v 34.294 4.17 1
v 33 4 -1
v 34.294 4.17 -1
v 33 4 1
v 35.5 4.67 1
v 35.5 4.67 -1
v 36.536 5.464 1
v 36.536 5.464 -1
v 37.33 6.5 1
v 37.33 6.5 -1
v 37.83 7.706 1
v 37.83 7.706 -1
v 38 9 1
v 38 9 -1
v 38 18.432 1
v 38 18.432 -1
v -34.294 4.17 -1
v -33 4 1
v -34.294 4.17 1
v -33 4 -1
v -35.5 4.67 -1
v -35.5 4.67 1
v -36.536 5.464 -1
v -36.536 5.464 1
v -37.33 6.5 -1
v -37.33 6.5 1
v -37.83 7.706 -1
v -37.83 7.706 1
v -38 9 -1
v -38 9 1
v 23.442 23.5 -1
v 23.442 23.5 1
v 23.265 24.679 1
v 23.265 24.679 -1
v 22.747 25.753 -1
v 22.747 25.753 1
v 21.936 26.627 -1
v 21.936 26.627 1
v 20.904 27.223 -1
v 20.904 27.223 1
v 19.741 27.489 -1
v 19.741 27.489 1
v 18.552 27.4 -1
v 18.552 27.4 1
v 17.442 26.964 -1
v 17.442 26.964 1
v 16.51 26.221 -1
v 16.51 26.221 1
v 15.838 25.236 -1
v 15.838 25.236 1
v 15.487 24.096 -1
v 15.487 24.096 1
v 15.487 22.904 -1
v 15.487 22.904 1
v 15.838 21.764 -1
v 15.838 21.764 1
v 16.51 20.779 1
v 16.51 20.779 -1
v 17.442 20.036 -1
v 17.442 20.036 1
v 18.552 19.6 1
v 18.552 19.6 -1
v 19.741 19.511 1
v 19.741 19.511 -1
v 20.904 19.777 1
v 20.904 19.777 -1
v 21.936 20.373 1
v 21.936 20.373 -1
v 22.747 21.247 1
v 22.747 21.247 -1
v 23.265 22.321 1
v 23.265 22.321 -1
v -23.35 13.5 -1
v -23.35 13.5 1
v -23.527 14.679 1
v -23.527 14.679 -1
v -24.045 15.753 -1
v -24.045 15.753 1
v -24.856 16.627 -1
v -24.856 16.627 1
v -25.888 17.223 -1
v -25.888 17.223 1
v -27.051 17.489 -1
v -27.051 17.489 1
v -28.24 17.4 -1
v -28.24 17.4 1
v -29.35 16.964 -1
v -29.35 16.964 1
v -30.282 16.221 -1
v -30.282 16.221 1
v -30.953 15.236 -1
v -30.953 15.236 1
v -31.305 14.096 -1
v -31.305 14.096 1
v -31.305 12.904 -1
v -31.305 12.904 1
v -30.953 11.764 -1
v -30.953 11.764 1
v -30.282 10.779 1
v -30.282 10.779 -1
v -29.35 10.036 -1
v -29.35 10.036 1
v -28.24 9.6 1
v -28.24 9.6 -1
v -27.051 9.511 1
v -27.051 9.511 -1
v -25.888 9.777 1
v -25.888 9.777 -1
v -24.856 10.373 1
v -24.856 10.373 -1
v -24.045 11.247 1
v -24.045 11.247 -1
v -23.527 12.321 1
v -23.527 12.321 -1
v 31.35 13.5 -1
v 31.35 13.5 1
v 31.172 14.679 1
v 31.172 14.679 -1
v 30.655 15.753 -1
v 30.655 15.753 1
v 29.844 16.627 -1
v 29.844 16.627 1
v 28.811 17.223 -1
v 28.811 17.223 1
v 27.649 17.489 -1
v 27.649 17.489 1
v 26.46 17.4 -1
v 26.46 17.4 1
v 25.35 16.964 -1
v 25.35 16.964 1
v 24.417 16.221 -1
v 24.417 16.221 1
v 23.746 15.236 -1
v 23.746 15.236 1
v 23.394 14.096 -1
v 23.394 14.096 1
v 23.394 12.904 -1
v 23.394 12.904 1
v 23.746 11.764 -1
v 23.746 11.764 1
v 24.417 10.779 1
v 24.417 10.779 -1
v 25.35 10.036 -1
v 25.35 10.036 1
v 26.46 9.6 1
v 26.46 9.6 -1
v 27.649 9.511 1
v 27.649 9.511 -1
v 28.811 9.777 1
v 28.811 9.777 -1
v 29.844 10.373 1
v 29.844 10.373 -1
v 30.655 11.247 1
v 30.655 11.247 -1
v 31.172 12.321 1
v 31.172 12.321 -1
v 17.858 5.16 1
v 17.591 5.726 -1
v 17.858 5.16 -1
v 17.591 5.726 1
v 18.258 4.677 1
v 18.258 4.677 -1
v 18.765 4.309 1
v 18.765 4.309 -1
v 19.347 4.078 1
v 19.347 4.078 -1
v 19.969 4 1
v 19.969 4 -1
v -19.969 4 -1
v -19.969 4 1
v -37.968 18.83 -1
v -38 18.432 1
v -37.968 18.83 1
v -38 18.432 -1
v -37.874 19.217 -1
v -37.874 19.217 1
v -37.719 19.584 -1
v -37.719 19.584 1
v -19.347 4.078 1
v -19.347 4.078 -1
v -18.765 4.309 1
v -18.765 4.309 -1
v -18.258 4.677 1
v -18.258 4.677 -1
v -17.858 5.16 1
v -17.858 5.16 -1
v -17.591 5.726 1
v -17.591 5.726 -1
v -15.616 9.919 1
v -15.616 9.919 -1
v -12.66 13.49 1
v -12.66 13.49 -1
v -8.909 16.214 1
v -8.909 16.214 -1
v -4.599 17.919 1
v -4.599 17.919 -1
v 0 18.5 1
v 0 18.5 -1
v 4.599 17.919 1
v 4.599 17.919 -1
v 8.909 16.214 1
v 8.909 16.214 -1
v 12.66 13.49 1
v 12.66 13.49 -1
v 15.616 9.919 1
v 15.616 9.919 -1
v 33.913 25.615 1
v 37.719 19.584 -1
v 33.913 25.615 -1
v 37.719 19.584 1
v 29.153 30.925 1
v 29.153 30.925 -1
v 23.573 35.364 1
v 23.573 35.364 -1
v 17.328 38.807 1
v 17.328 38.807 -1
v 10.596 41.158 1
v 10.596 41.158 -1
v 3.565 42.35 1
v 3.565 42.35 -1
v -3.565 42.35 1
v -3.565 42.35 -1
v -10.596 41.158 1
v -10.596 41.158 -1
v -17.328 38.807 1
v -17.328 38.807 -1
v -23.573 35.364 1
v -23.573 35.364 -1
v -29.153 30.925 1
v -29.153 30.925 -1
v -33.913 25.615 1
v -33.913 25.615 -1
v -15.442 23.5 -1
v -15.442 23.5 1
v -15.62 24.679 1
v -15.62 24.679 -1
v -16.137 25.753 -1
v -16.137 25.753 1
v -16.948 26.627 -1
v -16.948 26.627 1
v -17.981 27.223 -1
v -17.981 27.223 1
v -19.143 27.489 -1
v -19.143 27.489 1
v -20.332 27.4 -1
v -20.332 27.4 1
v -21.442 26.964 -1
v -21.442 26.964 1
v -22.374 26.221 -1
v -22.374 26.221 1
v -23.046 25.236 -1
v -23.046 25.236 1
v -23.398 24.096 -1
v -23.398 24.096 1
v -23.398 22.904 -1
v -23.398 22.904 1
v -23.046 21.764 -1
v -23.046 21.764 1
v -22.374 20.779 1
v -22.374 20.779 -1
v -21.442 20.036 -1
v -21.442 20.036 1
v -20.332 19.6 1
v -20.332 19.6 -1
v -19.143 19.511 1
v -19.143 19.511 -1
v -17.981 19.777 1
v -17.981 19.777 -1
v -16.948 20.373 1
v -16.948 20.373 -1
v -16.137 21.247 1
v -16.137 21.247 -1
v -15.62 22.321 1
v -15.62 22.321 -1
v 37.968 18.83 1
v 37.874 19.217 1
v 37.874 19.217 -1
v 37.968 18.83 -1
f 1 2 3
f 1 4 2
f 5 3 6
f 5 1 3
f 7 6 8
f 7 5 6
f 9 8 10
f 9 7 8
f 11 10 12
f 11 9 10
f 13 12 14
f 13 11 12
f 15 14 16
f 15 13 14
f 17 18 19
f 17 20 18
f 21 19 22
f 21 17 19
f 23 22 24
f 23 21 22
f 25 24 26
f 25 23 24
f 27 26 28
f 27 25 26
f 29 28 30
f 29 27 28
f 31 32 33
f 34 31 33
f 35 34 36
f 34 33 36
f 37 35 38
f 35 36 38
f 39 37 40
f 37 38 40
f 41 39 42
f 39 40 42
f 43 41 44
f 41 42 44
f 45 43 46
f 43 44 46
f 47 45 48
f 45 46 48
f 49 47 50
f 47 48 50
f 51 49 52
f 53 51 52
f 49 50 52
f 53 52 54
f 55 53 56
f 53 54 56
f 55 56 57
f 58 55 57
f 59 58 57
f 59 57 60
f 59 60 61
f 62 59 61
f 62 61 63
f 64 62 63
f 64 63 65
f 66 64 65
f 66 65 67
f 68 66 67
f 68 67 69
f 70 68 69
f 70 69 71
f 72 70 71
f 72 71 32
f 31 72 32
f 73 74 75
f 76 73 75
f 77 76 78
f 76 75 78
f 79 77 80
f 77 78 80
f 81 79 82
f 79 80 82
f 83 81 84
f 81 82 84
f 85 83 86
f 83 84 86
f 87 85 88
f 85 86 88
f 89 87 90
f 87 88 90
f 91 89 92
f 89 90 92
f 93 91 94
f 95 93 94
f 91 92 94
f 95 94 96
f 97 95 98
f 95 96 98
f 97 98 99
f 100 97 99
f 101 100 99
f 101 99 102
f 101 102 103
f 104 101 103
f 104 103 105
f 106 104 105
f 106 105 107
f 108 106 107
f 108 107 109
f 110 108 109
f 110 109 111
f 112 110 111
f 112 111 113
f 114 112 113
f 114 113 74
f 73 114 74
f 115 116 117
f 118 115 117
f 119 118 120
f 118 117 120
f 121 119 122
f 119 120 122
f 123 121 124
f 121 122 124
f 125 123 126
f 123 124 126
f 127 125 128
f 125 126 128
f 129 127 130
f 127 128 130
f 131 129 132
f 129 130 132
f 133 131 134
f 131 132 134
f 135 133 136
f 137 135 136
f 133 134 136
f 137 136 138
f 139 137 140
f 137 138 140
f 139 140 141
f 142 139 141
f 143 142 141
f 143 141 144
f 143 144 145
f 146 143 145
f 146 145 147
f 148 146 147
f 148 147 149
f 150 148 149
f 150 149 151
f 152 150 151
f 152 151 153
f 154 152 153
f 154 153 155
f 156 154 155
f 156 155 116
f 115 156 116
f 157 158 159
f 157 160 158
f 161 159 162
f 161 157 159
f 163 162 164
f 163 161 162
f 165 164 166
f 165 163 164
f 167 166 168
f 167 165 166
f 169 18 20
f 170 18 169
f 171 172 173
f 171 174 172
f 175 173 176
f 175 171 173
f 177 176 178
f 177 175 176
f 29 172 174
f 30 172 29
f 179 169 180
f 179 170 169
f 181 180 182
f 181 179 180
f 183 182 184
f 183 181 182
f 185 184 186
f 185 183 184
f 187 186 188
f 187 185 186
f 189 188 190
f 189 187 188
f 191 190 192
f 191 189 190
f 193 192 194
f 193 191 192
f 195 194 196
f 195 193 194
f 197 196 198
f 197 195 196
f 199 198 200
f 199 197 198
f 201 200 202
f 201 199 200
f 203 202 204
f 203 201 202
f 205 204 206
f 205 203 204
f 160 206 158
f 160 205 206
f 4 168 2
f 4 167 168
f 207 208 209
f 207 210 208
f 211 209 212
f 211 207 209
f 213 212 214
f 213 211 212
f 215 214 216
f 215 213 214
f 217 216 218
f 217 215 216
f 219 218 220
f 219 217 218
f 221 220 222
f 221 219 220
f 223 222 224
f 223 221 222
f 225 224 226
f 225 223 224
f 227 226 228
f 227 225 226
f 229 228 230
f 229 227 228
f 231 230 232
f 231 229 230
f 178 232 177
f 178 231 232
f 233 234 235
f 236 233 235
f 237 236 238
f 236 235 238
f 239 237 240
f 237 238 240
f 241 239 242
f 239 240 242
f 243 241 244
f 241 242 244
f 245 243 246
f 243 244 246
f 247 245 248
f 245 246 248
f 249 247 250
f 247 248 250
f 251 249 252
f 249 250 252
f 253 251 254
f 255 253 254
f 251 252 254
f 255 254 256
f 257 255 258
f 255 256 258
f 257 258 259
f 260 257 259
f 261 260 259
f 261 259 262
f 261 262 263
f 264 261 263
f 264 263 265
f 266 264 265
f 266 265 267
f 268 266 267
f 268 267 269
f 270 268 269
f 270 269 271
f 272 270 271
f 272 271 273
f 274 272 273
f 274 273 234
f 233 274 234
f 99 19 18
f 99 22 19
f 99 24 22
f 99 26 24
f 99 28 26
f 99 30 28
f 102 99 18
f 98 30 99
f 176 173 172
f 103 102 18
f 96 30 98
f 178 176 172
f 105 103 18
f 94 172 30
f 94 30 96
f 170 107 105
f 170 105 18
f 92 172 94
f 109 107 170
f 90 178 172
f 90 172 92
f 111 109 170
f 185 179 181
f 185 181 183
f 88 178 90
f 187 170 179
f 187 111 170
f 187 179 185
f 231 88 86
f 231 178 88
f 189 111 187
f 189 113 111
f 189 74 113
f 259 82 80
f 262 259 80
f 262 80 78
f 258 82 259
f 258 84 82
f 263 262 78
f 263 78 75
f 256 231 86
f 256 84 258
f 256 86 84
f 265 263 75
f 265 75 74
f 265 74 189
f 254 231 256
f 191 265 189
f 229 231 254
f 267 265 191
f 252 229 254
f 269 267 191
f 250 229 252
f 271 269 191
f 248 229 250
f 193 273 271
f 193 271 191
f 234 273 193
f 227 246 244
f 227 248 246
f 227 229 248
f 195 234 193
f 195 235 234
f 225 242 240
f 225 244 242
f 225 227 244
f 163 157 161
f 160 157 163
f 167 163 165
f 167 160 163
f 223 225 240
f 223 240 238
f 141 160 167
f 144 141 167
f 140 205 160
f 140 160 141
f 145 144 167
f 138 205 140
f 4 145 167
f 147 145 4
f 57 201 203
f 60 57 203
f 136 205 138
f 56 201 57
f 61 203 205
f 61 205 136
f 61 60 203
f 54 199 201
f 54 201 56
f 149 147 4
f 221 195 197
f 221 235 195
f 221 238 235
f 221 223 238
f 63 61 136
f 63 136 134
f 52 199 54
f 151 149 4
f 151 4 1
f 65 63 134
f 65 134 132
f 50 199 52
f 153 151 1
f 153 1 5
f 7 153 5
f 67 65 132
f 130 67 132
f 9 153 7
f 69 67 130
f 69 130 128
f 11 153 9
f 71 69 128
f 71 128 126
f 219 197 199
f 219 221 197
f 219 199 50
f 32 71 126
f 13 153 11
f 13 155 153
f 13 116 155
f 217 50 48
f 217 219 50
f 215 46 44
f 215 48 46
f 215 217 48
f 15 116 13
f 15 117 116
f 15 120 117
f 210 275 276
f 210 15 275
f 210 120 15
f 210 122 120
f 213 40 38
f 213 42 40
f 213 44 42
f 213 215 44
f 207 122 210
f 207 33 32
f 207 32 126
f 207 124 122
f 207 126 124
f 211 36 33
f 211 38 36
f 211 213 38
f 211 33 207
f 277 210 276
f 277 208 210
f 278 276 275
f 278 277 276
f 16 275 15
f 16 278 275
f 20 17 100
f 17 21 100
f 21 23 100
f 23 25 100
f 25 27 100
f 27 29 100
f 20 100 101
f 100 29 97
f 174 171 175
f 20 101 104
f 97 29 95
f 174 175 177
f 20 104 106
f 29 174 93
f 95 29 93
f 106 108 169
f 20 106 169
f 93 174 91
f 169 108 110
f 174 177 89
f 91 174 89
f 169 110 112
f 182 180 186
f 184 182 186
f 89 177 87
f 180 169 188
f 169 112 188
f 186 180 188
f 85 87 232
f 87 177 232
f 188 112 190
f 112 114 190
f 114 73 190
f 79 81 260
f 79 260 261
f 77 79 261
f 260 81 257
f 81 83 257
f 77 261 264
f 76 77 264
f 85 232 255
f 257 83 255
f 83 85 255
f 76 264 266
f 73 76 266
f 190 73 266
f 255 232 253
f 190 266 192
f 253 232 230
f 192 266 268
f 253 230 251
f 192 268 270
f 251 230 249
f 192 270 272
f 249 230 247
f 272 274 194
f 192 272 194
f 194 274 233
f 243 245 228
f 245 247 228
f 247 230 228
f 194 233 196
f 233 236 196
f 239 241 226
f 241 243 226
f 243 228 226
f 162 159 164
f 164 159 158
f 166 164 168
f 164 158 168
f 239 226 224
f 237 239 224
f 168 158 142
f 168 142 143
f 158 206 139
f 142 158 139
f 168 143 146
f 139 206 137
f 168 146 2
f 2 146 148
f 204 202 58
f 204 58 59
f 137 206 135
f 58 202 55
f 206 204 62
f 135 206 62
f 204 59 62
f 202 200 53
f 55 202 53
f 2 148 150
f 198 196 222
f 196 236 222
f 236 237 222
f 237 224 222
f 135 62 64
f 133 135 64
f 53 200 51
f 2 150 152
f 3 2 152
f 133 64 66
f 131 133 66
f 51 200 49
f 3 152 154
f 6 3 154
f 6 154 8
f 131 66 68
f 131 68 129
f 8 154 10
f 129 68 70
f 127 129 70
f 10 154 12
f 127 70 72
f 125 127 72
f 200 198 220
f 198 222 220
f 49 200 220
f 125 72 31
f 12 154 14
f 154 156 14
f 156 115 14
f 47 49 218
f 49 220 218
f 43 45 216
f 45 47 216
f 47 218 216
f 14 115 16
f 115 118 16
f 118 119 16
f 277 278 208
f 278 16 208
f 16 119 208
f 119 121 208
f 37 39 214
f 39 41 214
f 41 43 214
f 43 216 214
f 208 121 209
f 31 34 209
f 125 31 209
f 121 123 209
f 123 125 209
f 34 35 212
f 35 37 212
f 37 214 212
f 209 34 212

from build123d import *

# Parameters (mm, degrees)
BOSS_EXTRUDE1_DEPTH = 1
SKETCH2_R           = 4
CUT_EXTRUDE1_DEPTH  = 58.046034043
FILLET1_R           = 5
FILLET2_R           = 2.5


with BuildPart() as part:
    # Sketch1 → Boss-Extrude1 (new, symmetric)
    with BuildSketch(Plane.XY):
        with BuildLine():
            Line((-38, 4), (-18.062391868, 4))
            ThreePointArc((-18.062391868, 4), (0, 18.5), (18.062391868, 4))
            Line((18.062391868, 4), (38, 4))
            Line((38, 4), (38, 19.032866311))
            ThreePointArc((38, 19.032866311), (0, 42.5), (-38, 19.032866311))
            Line((-38, 19.032866311), (-38, 4))
        make_face()
    extrude(amount=BOSS_EXTRUDE1_DEPTH, both=True)

    # Sketch2 → Cut-Extrude1 (cut, through all)
    with BuildSketch(Plane.XY.offset(1)):
        with Locations((-27.349588662, 13.5)):
            Circle(SKETCH2_R)
        with Locations((-19.442222095, 23.5)):
            Circle(SKETCH2_R)
        with Locations((19.442222095, 23.5)):
            Circle(SKETCH2_R)
        with Locations((27.349588662, 13.5)):
            Circle(SKETCH2_R)
    extrude(amount=-CUT_EXTRUDE1_DEPTH, mode=Mode.SUBTRACT)

    # Fillet1
    fillet1_edges = [part.edges().sort_by_distance(p)[0] for p in [
        (38, 4, 0),
        (-38, 4, 0),
    ]]
    fillet(fillet1_edges, radius=FILLET1_R)

    # Fillet2
    fillet2_edges = [part.edges().sort_by_distance(p)[0] for p in [
        (-38, 19.032866311, 0),
        (38, 19.032866311, 0),
        (18.062391868, 4, 0),
        (-18.062391868, 4, 0),
    ]]
    fillet(fillet2_edges, radius=FILLET2_R)


solid = part.part
